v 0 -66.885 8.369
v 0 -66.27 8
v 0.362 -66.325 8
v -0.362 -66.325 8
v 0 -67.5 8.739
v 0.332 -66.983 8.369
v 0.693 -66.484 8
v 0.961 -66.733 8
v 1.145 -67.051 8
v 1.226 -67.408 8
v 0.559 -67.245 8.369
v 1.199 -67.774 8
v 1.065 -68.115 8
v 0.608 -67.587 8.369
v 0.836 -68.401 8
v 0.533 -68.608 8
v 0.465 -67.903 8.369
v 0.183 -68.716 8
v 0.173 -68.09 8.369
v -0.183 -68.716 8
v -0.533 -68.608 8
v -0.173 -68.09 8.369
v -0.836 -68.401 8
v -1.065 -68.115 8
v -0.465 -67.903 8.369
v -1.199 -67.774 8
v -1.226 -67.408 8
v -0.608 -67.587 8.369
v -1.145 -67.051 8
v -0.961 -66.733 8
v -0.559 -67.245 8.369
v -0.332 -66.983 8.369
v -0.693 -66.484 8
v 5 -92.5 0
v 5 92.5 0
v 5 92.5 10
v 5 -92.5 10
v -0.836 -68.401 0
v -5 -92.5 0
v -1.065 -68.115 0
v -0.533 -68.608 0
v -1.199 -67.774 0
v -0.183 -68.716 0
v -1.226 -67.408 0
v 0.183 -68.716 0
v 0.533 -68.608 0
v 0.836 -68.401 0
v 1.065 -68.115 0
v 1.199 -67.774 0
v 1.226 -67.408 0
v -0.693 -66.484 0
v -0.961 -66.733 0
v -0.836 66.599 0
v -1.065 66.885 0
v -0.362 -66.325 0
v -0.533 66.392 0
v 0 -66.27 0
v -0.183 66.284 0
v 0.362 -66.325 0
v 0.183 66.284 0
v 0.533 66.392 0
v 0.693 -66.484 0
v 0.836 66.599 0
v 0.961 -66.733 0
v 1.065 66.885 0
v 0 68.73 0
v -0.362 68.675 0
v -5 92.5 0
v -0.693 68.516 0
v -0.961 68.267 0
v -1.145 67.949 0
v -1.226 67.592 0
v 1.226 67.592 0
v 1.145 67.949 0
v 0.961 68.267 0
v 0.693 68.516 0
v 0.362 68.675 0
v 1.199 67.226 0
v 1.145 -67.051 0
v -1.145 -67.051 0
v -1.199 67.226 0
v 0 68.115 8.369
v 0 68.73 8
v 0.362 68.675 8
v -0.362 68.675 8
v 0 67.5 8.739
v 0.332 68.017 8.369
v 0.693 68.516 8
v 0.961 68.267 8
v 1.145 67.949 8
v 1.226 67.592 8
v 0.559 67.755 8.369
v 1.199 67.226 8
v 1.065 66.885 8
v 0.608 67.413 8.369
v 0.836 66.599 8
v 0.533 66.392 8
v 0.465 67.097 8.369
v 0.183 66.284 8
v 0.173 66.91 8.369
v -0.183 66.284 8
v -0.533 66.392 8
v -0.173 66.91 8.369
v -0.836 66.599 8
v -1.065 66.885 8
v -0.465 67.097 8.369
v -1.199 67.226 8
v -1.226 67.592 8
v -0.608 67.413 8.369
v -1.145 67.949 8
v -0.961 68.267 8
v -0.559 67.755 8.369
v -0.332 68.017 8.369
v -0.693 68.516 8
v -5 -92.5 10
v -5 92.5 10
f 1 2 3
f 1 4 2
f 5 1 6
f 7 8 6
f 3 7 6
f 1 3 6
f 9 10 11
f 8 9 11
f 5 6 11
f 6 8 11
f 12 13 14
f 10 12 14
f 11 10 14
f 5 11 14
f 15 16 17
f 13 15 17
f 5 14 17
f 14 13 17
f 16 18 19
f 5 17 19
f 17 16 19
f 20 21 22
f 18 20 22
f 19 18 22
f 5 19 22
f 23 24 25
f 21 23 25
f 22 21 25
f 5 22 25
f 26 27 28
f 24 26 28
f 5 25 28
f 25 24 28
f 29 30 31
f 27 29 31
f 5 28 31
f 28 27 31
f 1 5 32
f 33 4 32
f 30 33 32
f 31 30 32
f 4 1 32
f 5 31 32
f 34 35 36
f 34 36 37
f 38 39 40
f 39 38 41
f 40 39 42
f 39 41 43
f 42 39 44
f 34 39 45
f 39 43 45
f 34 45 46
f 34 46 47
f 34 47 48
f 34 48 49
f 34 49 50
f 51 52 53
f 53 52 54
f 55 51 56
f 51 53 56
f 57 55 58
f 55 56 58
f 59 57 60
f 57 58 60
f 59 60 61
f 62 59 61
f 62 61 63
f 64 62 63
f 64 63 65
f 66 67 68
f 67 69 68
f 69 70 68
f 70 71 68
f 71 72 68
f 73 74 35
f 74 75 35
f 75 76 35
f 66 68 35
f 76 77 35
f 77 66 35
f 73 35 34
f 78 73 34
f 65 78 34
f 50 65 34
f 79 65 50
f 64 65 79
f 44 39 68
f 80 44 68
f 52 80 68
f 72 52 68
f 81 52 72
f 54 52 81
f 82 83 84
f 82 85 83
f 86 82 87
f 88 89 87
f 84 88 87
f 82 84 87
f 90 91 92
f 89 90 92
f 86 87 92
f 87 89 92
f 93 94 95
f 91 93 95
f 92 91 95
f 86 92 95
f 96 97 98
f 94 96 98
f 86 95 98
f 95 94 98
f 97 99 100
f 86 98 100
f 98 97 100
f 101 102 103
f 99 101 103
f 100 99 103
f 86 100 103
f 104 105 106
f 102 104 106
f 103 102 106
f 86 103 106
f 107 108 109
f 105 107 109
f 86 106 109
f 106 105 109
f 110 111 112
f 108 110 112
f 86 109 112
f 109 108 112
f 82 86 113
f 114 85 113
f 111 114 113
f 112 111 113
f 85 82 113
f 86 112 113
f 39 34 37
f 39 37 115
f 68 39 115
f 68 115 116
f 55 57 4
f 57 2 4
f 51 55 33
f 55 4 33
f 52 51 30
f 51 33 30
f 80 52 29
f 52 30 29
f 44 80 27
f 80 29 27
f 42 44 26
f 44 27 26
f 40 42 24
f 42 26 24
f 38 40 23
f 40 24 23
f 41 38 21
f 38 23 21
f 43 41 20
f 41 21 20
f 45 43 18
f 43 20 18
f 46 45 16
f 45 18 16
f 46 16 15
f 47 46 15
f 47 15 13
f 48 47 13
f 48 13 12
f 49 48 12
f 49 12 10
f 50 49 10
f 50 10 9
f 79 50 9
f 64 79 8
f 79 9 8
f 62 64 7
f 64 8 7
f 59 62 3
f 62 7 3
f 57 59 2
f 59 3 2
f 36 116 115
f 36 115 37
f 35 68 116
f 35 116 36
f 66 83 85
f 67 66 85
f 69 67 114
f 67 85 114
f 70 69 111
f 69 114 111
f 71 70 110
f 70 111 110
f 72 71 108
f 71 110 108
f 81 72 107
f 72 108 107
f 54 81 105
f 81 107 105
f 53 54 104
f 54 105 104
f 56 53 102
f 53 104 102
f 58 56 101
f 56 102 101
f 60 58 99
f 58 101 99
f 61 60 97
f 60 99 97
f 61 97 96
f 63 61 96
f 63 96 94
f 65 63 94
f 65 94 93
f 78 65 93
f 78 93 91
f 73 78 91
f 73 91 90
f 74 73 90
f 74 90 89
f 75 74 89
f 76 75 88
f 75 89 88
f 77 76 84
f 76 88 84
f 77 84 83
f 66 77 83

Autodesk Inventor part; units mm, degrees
ref_plane "YZ Plane" through (0, 0, 0) normal (1, 0, 0) x (0, 1, 0)
ref_plane "XZ Plane" through (0, 0, 0) normal (0, 1, 0) x (-1, 0, 0)
ref_plane "XY Plane" through (0, 0, 0) normal (0, 0, 1) x (1, 0, 0)
sketch "Esboço1" plane through (0, 0, 0) normal (0, 0, 1) x (1, 0, 0)
  line L0 (-7, 0) -> (7, 0) construction
  line L1 (0, -129.5) -> (0, 129.5) construction
  line L2 (-5, 92.5) -> (5, 92.5)
  line L3 (5, 92.5) -> (5, -92.5)
  line L4 (5, -92.5) -> (-5, -92.5)
  line L5 (-5, -92.5) -> (-5, 92.5)
  point P0 (0, 0)
  point P1 (0, -67.5)
  point P2 (0, 0)
  point P3 (0, 67.5)
  dimension "d0" = 10
  dimension "d1" = 185
  dimension "d4" = 67.5
extrude "Extrusão1" add sketch "Esboço1" along normal blind 10
hole "Furo1" at (0, -67.5, 0) at (0, 67.5, 0) direction (0, 0, 1) diameter 2.459 depth 8 tip angle 118 thread size "M3x0.5" class "6H" standard "ISO Metric profile"
equation "\"d2\" = d0"
properties part number "VEJ-00-014" material "Durastone BK"
